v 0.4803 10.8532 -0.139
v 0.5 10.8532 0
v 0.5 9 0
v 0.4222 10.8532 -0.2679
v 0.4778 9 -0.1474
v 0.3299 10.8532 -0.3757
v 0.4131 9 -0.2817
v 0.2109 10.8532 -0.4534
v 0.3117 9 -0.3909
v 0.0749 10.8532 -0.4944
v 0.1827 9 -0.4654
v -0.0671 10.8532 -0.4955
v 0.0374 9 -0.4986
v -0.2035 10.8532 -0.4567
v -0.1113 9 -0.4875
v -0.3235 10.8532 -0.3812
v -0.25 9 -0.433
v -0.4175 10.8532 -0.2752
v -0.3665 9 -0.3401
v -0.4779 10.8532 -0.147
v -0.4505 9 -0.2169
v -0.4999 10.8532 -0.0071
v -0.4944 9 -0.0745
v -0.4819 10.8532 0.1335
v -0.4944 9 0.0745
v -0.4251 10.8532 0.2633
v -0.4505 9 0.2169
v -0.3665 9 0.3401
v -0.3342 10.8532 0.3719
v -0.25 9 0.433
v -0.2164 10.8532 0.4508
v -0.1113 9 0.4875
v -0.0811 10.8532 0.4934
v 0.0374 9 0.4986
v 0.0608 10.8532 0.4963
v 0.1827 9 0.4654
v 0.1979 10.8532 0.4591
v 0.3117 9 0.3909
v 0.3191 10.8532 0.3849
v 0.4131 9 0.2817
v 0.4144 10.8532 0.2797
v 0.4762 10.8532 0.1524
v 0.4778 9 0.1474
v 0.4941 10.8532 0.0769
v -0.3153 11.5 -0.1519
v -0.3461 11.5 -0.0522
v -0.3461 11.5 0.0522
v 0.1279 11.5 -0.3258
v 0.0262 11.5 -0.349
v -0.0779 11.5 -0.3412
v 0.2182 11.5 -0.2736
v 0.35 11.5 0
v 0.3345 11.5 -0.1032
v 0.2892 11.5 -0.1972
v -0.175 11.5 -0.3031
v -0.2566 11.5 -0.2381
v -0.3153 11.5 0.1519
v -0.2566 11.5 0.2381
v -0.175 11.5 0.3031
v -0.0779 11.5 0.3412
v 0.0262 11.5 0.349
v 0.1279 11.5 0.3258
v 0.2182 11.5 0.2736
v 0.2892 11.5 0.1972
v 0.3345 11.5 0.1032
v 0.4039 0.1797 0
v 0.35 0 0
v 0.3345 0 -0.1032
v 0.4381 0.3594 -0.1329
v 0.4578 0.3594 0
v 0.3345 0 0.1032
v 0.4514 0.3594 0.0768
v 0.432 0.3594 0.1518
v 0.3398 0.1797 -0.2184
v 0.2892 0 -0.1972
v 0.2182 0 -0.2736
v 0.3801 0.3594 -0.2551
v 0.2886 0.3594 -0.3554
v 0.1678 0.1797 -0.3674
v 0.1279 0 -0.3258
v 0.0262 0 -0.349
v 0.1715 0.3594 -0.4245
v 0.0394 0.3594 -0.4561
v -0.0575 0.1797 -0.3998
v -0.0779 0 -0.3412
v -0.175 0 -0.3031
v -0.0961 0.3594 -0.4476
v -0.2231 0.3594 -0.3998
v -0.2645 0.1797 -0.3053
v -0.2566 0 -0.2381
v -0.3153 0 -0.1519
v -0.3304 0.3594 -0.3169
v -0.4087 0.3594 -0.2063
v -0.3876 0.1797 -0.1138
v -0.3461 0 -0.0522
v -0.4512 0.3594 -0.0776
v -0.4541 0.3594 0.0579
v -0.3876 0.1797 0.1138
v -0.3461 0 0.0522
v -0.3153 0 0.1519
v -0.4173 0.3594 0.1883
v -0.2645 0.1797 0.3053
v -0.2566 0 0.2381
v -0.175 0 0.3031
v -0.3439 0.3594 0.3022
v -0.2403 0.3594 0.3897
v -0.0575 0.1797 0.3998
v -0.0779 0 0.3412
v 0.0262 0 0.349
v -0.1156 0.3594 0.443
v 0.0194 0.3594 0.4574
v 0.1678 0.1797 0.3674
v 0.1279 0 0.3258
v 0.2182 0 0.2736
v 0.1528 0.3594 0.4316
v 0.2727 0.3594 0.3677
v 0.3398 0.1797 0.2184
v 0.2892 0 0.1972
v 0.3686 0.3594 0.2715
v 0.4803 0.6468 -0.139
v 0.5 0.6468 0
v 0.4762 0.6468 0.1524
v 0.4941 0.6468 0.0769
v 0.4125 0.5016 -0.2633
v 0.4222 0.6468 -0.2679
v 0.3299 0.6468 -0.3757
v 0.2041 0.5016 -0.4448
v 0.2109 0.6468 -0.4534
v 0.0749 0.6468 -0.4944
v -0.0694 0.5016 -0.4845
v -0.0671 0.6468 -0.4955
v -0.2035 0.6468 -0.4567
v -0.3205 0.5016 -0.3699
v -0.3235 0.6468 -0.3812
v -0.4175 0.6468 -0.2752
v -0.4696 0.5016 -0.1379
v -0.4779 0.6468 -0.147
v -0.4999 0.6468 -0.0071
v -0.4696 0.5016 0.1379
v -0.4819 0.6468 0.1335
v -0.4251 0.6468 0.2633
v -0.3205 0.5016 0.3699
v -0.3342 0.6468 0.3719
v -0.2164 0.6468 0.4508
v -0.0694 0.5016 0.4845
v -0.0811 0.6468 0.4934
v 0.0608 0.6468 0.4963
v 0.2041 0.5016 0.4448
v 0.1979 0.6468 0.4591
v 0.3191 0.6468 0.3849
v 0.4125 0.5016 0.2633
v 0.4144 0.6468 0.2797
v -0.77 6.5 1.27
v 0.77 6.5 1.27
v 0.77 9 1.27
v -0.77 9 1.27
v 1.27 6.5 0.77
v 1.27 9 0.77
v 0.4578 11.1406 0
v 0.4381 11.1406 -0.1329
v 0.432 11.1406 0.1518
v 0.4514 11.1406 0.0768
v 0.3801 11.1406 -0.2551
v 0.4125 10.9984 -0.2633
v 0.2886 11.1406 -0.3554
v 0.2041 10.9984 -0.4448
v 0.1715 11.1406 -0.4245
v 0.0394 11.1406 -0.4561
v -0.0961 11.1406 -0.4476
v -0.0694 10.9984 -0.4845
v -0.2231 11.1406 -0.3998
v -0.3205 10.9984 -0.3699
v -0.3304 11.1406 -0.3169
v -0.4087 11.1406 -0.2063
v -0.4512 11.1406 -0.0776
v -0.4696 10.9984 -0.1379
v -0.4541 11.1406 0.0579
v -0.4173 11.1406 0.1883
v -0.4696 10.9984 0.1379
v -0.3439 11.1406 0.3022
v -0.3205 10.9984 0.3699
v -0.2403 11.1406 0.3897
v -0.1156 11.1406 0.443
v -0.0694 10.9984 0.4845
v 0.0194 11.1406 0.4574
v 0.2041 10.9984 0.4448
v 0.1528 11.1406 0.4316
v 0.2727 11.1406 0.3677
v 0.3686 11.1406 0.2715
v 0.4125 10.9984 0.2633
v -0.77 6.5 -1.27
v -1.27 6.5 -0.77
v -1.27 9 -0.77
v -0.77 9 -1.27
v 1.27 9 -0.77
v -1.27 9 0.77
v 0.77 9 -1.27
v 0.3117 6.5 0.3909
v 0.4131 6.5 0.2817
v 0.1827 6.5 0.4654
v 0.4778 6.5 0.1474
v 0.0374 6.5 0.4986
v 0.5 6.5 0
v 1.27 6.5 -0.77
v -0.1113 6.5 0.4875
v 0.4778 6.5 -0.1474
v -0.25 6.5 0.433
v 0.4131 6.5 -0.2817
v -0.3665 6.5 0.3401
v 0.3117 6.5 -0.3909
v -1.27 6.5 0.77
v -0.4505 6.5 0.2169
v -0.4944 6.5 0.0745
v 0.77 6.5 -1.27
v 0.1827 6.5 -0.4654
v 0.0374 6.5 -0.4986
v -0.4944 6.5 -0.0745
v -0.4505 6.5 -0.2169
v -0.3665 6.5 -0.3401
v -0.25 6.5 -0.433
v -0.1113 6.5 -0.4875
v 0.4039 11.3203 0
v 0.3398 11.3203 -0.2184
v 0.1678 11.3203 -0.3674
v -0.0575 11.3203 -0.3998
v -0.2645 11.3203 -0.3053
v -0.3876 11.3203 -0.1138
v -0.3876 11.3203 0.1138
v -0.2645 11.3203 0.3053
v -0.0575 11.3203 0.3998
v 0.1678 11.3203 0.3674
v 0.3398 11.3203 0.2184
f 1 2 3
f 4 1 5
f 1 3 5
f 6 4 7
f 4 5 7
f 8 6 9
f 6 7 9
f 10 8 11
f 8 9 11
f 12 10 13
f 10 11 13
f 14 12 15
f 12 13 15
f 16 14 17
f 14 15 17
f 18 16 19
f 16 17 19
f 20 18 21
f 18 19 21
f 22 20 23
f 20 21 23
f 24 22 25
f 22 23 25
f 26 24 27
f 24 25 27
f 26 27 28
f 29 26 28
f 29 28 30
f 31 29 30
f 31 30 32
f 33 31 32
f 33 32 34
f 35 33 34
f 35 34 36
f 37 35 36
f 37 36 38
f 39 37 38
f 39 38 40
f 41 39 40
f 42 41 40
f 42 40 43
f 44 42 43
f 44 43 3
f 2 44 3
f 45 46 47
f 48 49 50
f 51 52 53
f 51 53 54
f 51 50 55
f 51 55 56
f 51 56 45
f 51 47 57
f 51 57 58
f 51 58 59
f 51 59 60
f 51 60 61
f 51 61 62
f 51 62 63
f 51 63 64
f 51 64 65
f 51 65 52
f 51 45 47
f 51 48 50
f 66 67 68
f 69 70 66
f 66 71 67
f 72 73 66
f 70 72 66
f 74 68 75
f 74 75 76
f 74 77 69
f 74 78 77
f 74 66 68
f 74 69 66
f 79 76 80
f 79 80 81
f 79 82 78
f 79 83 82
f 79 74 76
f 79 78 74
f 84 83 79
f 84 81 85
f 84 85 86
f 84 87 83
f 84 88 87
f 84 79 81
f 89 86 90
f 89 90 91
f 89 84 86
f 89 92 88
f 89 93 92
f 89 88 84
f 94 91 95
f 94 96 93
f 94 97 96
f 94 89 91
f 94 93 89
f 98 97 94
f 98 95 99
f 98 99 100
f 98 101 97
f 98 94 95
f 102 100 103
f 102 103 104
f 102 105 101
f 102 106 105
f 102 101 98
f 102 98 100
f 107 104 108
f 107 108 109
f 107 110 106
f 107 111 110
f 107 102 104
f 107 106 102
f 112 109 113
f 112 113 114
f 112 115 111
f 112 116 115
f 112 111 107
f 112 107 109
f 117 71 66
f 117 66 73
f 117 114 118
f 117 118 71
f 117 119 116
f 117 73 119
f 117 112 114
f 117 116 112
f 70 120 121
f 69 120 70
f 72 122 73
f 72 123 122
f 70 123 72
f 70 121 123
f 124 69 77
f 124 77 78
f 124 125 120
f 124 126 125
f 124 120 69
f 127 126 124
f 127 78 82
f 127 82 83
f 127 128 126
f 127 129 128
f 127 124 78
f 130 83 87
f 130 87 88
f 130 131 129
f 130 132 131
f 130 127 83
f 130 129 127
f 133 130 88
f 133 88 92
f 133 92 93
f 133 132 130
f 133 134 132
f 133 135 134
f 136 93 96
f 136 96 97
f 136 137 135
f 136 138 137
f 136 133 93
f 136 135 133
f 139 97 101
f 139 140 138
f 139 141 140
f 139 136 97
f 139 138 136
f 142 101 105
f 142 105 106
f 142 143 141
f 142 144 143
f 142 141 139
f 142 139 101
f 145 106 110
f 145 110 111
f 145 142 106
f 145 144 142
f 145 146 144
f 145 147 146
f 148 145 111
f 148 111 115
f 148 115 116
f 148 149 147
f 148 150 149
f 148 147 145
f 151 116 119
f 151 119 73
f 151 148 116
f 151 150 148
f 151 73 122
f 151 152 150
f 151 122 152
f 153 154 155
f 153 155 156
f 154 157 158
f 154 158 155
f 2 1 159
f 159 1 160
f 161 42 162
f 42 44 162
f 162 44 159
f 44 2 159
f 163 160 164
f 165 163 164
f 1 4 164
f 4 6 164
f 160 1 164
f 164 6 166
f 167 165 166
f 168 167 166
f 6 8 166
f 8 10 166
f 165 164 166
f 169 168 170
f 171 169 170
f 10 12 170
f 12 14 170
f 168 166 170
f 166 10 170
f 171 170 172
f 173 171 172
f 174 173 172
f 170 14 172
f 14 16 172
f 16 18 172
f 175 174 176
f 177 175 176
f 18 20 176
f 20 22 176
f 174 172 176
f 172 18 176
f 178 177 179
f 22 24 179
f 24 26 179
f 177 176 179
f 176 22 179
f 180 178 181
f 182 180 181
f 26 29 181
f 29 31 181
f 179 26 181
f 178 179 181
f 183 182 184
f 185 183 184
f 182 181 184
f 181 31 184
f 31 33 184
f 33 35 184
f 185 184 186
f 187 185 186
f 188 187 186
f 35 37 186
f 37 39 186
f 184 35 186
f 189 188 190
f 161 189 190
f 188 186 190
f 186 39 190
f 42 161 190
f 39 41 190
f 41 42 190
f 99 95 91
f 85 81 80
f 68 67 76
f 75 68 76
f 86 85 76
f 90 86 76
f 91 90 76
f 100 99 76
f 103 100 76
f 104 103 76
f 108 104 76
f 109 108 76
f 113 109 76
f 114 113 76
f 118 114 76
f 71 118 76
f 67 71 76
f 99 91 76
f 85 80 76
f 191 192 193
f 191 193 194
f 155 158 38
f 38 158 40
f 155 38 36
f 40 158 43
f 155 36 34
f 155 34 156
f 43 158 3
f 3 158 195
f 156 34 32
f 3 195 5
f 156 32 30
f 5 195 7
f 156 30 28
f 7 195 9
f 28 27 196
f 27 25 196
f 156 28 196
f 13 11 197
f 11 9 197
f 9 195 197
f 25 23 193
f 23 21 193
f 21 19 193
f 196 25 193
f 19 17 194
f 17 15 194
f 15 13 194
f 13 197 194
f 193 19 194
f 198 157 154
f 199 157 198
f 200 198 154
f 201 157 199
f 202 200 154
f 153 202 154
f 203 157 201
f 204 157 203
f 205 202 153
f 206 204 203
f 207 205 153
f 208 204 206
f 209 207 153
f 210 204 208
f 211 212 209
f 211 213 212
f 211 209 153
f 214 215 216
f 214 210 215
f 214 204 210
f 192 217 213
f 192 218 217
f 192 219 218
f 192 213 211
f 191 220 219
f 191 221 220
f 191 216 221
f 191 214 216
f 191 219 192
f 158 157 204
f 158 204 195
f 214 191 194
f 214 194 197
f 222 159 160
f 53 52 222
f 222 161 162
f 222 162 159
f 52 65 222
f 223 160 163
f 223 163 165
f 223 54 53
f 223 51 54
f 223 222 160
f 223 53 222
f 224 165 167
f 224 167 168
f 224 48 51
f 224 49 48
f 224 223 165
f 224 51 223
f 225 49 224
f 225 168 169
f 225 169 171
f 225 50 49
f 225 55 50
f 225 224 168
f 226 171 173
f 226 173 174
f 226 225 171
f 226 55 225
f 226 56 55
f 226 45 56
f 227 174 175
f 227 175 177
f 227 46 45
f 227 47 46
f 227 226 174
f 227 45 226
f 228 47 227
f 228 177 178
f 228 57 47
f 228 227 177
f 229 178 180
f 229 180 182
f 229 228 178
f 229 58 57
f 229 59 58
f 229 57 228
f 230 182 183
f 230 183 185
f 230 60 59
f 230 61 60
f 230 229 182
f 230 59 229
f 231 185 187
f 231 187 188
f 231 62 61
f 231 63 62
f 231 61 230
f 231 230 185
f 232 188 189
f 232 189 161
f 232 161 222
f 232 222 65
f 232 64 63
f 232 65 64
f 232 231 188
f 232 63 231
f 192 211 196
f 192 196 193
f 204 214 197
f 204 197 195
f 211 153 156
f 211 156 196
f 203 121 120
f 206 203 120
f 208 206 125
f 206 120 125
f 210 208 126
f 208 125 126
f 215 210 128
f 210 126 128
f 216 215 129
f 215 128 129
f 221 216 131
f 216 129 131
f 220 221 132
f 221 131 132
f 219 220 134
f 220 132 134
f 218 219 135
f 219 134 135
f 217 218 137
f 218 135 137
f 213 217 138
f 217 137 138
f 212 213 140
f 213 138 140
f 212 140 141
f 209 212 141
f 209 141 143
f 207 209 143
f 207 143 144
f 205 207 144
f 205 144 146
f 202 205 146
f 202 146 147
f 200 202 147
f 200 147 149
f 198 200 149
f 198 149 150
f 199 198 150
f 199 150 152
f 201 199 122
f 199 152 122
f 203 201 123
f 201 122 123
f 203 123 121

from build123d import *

# Parameters (mm, degrees)
SKETCH1_R               = 0.5
BOSS_EXTRUDE1_DEPTH     = 11.5
BOSS_EXTRUDE1_2_DEPTH   = 11.5
BOSS_EXTRUDE1_3_DEPTH   = 11.5
BOSS_EXTRUDE1_4_DEPTH   = 11.5
BOSS_EXTRUDE1_5_DEPTH   = 11.5
BOSS_EXTRUDE1_6_DEPTH   = 11.5
BOSS_EXTRUDE1_7_DEPTH   = 11.5
BOSS_EXTRUDE1_8_DEPTH   = 11.5
BOSS_EXTRUDE1_9_DEPTH   = 11.5
BOSS_EXTRUDE1_10_DEPTH  = 11.5
BOSS_EXTRUDE1_11_DEPTH  = 11.5
BOSS_EXTRUDE1_12_DEPTH  = 11.5
BOSS_EXTRUDE1_13_DEPTH  = 11.5
BOSS_EXTRUDE1_14_DEPTH  = 11.5
BOSS_EXTRUDE1_15_DEPTH  = 11.5
BOSS_EXTRUDE1_16_DEPTH  = 11.5
BOSS_EXTRUDE2_DEPTH     = 2.5
CHAMFER1_SIZE           = 0.5
CHAMFER1_SIZE2          = 0.15
CHAMFER1_PART_2_SIZE    = 0.5
CHAMFER1_PART_2_SIZE2   = 0.15
CHAMFER1_PART_3_SIZE    = 0.5
CHAMFER1_PART_3_SIZE2   = 0.15
CHAMFER1_PART_4_SIZE    = 0.5
CHAMFER1_PART_4_SIZE2   = 0.15
CHAMFER1_PART_5_SIZE    = 0.5
CHAMFER1_PART_5_SIZE2   = 0.15
CHAMFER1_PART_6_SIZE    = 0.5
CHAMFER1_PART_6_SIZE2   = 0.15
CHAMFER1_PART_7_SIZE    = 0.5
CHAMFER1_PART_7_SIZE2   = 0.15
CHAMFER1_PART_8_SIZE    = 0.5
CHAMFER1_PART_8_SIZE2   = 0.15
CHAMFER1_PART_9_SIZE    = 0.5
CHAMFER1_PART_9_SIZE2   = 0.15
CHAMFER1_PART_10_SIZE   = 0.5
CHAMFER1_PART_10_SIZE2  = 0.15
CHAMFER1_PART_11_SIZE   = 0.5
CHAMFER1_PART_11_SIZE2  = 0.15
CHAMFER1_PART_12_SIZE   = 0.5
CHAMFER1_PART_12_SIZE2  = 0.15
CHAMFER1_PART_13_SIZE   = 0.5
CHAMFER1_PART_13_SIZE2  = 0.15
CHAMFER1_PART_14_SIZE   = 0.5
CHAMFER1_PART_14_SIZE2  = 0.15
CHAMFER1_PART_15_SIZE   = 0.5
CHAMFER1_PART_15_SIZE2  = 0.15
CHAMFER1_PART_16_SIZE   = 0.5
CHAMFER1_PART_16_SIZE2  = 0.15
FILLET1_R               = 1
CHAMFER2_SIZE           = 0.15
CHAMFER2_SIZE2          = 0.5
CHAMFER2_PART_2_SIZE    = 0.15
CHAMFER2_PART_2_SIZE2   = 0.5
CHAMFER2_PART_3_SIZE    = 0.15
CHAMFER2_PART_3_SIZE2   = 0.5
CHAMFER2_PART_4_SIZE    = 0.15
CHAMFER2_PART_4_SIZE2   = 0.5
CHAMFER2_PART_5_SIZE    = 0.15
CHAMFER2_PART_5_SIZE2   = 0.5
CHAMFER2_PART_6_SIZE    = 0.15
CHAMFER2_PART_6_SIZE2   = 0.5
CHAMFER2_PART_7_SIZE    = 0.15
CHAMFER2_PART_7_SIZE2   = 0.5
CHAMFER2_PART_8_SIZE    = 0.15
CHAMFER2_PART_8_SIZE2   = 0.5
CHAMFER2_PART_9_SIZE    = 0.15
CHAMFER2_PART_9_SIZE2   = 0.5
CHAMFER2_PART_10_SIZE   = 0.15
CHAMFER2_PART_10_SIZE2  = 0.5
CHAMFER2_PART_11_SIZE   = 0.15
CHAMFER2_PART_11_SIZE2  = 0.5
CHAMFER2_PART_12_SIZE   = 0.15
CHAMFER2_PART_12_SIZE2  = 0.5
CHAMFER2_PART_13_SIZE   = 0.15
CHAMFER2_PART_13_SIZE2  = 0.5
CHAMFER2_PART_14_SIZE   = 0.15
CHAMFER2_PART_14_SIZE2  = 0.5
CHAMFER2_PART_15_SIZE   = 0.15
CHAMFER2_PART_15_SIZE2  = 0.5
CHAMFER2_PART_16_SIZE   = 0.15
CHAMFER2_PART_16_SIZE2  = 0.5
FILLET2_R               = 1
SKETCH3_W               = 38.1
SKETCH3_H               = 11.5
CUT_EXTRUDE1_DEPTH      = 1
CUT_EXTRUDE1_DEPTH_BACK = 3.54


with BuildPart() as part:
    # Sketch1 → Boss-Extrude1 (new body)
    with BuildSketch(Plane(origin=(0, 0, 0), x_dir=(1, 0, 0), z_dir=(0, 1, 0))):
        Circle(SKETCH1_R)
    extrude(amount=BOSS_EXTRUDE1_DEPTH)



with BuildPart() as body_2:
    # Sketch1 → Boss-Extrude1 2 (new body)
    with BuildSketch(Plane(origin=(0, 0, 0), x_dir=(1, 0, 0), z_dir=(0, 1, 0))):
        with Locations((2.54, 0)):
            Circle(SKETCH1_R)
    extrude(amount=BOSS_EXTRUDE1_2_DEPTH)


with BuildPart() as body_3:
    # Sketch1 → Boss-Extrude1 3 (new body)
    with BuildSketch(Plane(origin=(0, 0, 0), x_dir=(1, 0, 0), z_dir=(0, 1, 0))):
        with Locations((5.08, 0)):
            Circle(SKETCH1_R)
    extrude(amount=BOSS_EXTRUDE1_3_DEPTH)


with BuildPart() as body_4:
    # Sketch1 → Boss-Extrude1 4 (new body)
    with BuildSketch(Plane(origin=(0, 0, 0), x_dir=(1, 0, 0), z_dir=(0, 1, 0))):
        with Locations((7.62, 0)):
            Circle(SKETCH1_R)
    extrude(amount=BOSS_EXTRUDE1_4_DEPTH)


with BuildPart() as body_5:
    # Sketch1 → Boss-Extrude1 5 (new body)
    with BuildSketch(Plane(origin=(0, 0, 0), x_dir=(1, 0, 0), z_dir=(0, 1, 0))):
        with Locations((10.16, 0)):
            Circle(SKETCH1_R)
    extrude(amount=BOSS_EXTRUDE1_5_DEPTH)


with BuildPart() as body_6:
    # Sketch1 → Boss-Extrude1 6 (new body)
    with BuildSketch(Plane(origin=(0, 0, 0), x_dir=(1, 0, 0), z_dir=(0, 1, 0))):
        with Locations((12.7, 0)):
            Circle(SKETCH1_R)
    extrude(amount=BOSS_EXTRUDE1_6_DEPTH)


with BuildPart() as body_7:
    # Sketch1 → Boss-Extrude1 7 (new body)
    with BuildSketch(Plane(origin=(0, 0, 0), x_dir=(1, 0, 0), z_dir=(0, 1, 0))):
        with Locations((15.24, 0)):
            Circle(SKETCH1_R)
    extrude(amount=BOSS_EXTRUDE1_7_DEPTH)


with BuildPart() as body_8:
    # Sketch1 → Boss-Extrude1 8 (new body)
    with BuildSketch(Plane(origin=(0, 0, 0), x_dir=(1, 0, 0), z_dir=(0, 1, 0))):
        with Locations((17.78, 0)):
            Circle(SKETCH1_R)
    extrude(amount=BOSS_EXTRUDE1_8_DEPTH)


with BuildPart() as body_9:
    # Sketch1 → Boss-Extrude1 9 (new body)
    with BuildSketch(Plane(origin=(0, 0, 0), x_dir=(1, 0, 0), z_dir=(0, 1, 0))):
        with Locations((20.32, 0)):
            Circle(SKETCH1_R)
    extrude(amount=BOSS_EXTRUDE1_9_DEPTH)


with BuildPart() as body_10:
    # Sketch1 → Boss-Extrude1 10 (new body)
    with BuildSketch(Plane(origin=(0, 0, 0), x_dir=(1, 0, 0), z_dir=(0, 1, 0))):
        with Locations((22.86, 0)):
            Circle(SKETCH1_R)
    extrude(amount=BOSS_EXTRUDE1_10_DEPTH)


with BuildPart() as body_11:
    # Sketch1 → Boss-Extrude1 11 (new body)
    with BuildSketch(Plane(origin=(0, 0, 0), x_dir=(1, 0, 0), z_dir=(0, 1, 0))):
        with Locations((25.4, 0)):
            Circle(SKETCH1_R)
    extrude(amount=BOSS_EXTRUDE1_11_DEPTH)


with BuildPart() as body_12:
    # Sketch1 → Boss-Extrude1 12 (new body)
    with BuildSketch(Plane(origin=(0, 0, 0), x_dir=(1, 0, 0), z_dir=(0, 1, 0))):
        with Locations((27.94, 0)):
            Circle(SKETCH1_R)
    extrude(amount=BOSS_EXTRUDE1_12_DEPTH)


with BuildPart() as body_13:
    # Sketch1 → Boss-Extrude1 13 (new body)
    with BuildSketch(Plane(origin=(0, 0, 0), x_dir=(1, 0, 0), z_dir=(0, 1, 0))):
        with Locations((30.48, 0)):
            Circle(SKETCH1_R)
    extrude(amount=BOSS_EXTRUDE1_13_DEPTH)


with BuildPart() as body_14:
    # Sketch1 → Boss-Extrude1 14 (new body)
    with BuildSketch(Plane(origin=(0, 0, 0), x_dir=(1, 0, 0), z_dir=(0, 1, 0))):
        with Locations((33.02, 0)):
            Circle(SKETCH1_R)
    extrude(amount=BOSS_EXTRUDE1_14_DEPTH)


with BuildPart() as body_15:
    # Sketch1 → Boss-Extrude1 15 (new body)
    with BuildSketch(Plane(origin=(0, 0, 0), x_dir=(1, 0, 0), z_dir=(0, 1, 0))):
        with Locations((35.56, 0)):
            Circle(SKETCH1_R)
    extrude(amount=BOSS_EXTRUDE1_15_DEPTH)


with BuildPart() as body_16:
    # Sketch1 → Boss-Extrude1 16 (new body)
    with BuildSketch(Plane(origin=(0, 0, 0), x_dir=(1, 0, 0), z_dir=(0, 1, 0))):
        with Locations((38.1, 0)):
            Circle(SKETCH1_R)
    extrude(amount=BOSS_EXTRUDE1_16_DEPTH)


with BuildPart() as part_1:
    add(part.part)

    add(body_2.part)  # Boss-Extrude2 merges body 2

    add(body_3.part)  # Boss-Extrude2 merges body 3

    add(body_4.part)  # Boss-Extrude2 merges body 4

    add(body_5.part)  # Boss-Extrude2 merges body 5

    add(body_6.part)  # Boss-Extrude2 merges body 6

    add(body_7.part)  # Boss-Extrude2 merges body 7

    add(body_8.part)  # Boss-Extrude2 merges body 8

    add(body_9.part)  # Boss-Extrude2 merges body 9

    add(body_10.part)  # Boss-Extrude2 merges body 10

    add(body_11.part)  # Boss-Extrude2 merges body 11

    add(body_12.part)  # Boss-Extrude2 merges body 12

    add(body_13.part)  # Boss-Extrude2 merges body 13

    add(body_14.part)  # Boss-Extrude2 merges body 14

    add(body_15.part)  # Boss-Extrude2 merges body 15

    add(body_16.part)  # Boss-Extrude2 merges body 16
    # Sketch2 → Boss-Extrude2 (add)
    with BuildSketch(Plane(origin=(0, 6.5, 0), x_dir=(1, 0, 0), z_dir=(0, 1, 0))):
        Polygon((-1.27, 0.77), (-0.77, 1.27), (0.77, 1.27), (1.27, 0.77), (1.77, 1.27), (3.31, 1.27), (3.81, 0.77), (4.31, 1.27), (5.85, 1.27), (6.35, 0.77), (6.85, 1.27), (8.39, 1.27), (8.89, 0.77), (9.39, 1.27), (10.93, 1.27), (11.43, 0.77), (11.93, 1.27), (13.47, 1.27), (13.97, 0.77), (14.47, 1.27), (16.01, 1.27), (16.51, 0.77), (17.01, 1.27), (18.55, 1.27), (19.05, 0.77), (19.55, 1.27), (21.09, 1.27), (21.59, 0.77), (22.09, 1.27), (23.63, 1.27), (24.13, 0.77), (24.63, 1.27), (26.17, 1.27), (26.67, 0.77), (27.17, 1.27), (28.71, 1.27), (29.21, 0.77), (29.71, 1.27), (31.25, 1.27), (31.75, 0.77), (32.25, 1.27), (33.79, 1.27), (34.29, 0.77), (34.79, 1.27), (36.33, 1.27), (36.83, 0.77), (37.33, 1.27), (38.87, 1.27), (39.37, 0.77), (39.37, -0.77), (38.87, -1.27), (37.33, -1.27), (36.83, -0.77), (36.33, -1.27), (34.79, -1.27), (34.29, -0.77), (33.79, -1.27), (32.25, -1.27), (31.75, -0.77), (31.25, -1.27), (29.71, -1.27), (29.21, -0.77), (28.71, -1.27), (27.17, -1.27), (26.67, -0.77), (26.17, -1.27), (24.63, -1.27), (24.13, -0.77), (23.63, -1.27), (22.09, -1.27), (21.59, -0.77), (21.09, -1.27), (19.55, -1.27), (19.05, -0.77), (18.55, -1.27), (17.01, -1.27), (16.51, -0.77), (16.01, -1.27), (14.47, -1.27), (13.97, -0.77), (13.47, -1.27), (11.93, -1.27), (11.43, -0.77), (10.93, -1.27), (9.39, -1.27), (8.89, -0.77), (8.39, -1.27), (6.85, -1.27), (6.35, -0.77), (5.85, -1.27), (4.31, -1.27), (3.81, -0.77), (3.31, -1.27), (1.77, -1.27), (1.27, -0.77), (0.77, -1.27), (-0.77, -1.27), (-1.27, -0.77), align=None)
    extrude(amount=BOSS_EXTRUDE2_DEPTH)

    # Chamfer1
    chamfer1_edges = [part_1.edges().sort_by_distance(p)[0] for p in [
        (2.04, 11.5, 0),
    ]]
    chamfer1_side = [part_1.faces().sort_by_distance(p)[0] for p in [
        (2.04, 10.25, 0),
    ]]
    chamfer(chamfer1_edges, length=CHAMFER1_SIZE, length2=CHAMFER1_SIZE2, reference=chamfer1_side[0])

    # Chamfer1 part 2
    chamfer1_part_2_edges = [part_1.edges().sort_by_distance(p)[0] for p in [
        (4.58, 11.5, 0),
    ]]
    chamfer1_part_2_side = [part_1.faces().sort_by_distance(p)[0] for p in [
        (4.58, 10.25, 0),
    ]]
    chamfer(chamfer1_part_2_edges, length=CHAMFER1_PART_2_SIZE, length2=CHAMFER1_PART_2_SIZE2, reference=chamfer1_part_2_side[0])

    # Chamfer1 part 3
    chamfer1_part_3_edges = [part_1.edges().sort_by_distance(p)[0] for p in [
        (7.12, 11.5, 0),
    ]]
    chamfer1_part_3_side = [part_1.faces().sort_by_distance(p)[0] for p in [
        (7.12, 10.25, 0),
    ]]
    chamfer(chamfer1_part_3_edges, length=CHAMFER1_PART_3_SIZE, length2=CHAMFER1_PART_3_SIZE2, reference=chamfer1_part_3_side[0])

    # Chamfer1 part 4
    chamfer1_part_4_edges = [part_1.edges().sort_by_distance(p)[0] for p in [
        (9.66, 11.5, 0),
    ]]
    chamfer1_part_4_side = [part_1.faces().sort_by_distance(p)[0] for p in [
        (9.66, 10.25, 0),
    ]]
    chamfer(chamfer1_part_4_edges, length=CHAMFER1_PART_4_SIZE, length2=CHAMFER1_PART_4_SIZE2, reference=chamfer1_part_4_side[0])

    # Chamfer1 part 5
    chamfer1_part_5_edges = [part_1.edges().sort_by_distance(p)[0] for p in [
        (12.2, 11.5, 0),
    ]]
    chamfer1_part_5_side = [part_1.faces().sort_by_distance(p)[0] for p in [
        (12.2, 10.25, 0),
    ]]
    chamfer(chamfer1_part_5_edges, length=CHAMFER1_PART_5_SIZE, length2=CHAMFER1_PART_5_SIZE2, reference=chamfer1_part_5_side[0])

    # Chamfer1 part 6
    chamfer1_part_6_edges = [part_1.edges().sort_by_distance(p)[0] for p in [
        (14.74, 11.5, 0),
    ]]
    chamfer1_part_6_side = [part_1.faces().sort_by_distance(p)[0] for p in [
        (14.74, 10.25, 0),
    ]]
    chamfer(chamfer1_part_6_edges, length=CHAMFER1_PART_6_SIZE, length2=CHAMFER1_PART_6_SIZE2, reference=chamfer1_part_6_side[0])

    # Chamfer1 part 7
    chamfer1_part_7_edges = [part_1.edges().sort_by_distance(p)[0] for p in [
        (17.28, 11.5, 0),
    ]]
    chamfer1_part_7_side = [part_1.faces().sort_by_distance(p)[0] for p in [
        (17.28, 10.25, 0),
    ]]
    chamfer(chamfer1_part_7_edges, length=CHAMFER1_PART_7_SIZE, length2=CHAMFER1_PART_7_SIZE2, reference=chamfer1_part_7_side[0])

    # Chamfer1 part 8
    chamfer1_part_8_edges = [part_1.edges().sort_by_distance(p)[0] for p in [
        (19.82, 11.5, 0),
    ]]
    chamfer1_part_8_side = [part_1.faces().sort_by_distance(p)[0] for p in [
        (19.82, 10.25, 0),
    ]]
    chamfer(chamfer1_part_8_edges, length=CHAMFER1_PART_8_SIZE, length2=CHAMFER1_PART_8_SIZE2, reference=chamfer1_part_8_side[0])

    # Chamfer1 part 9
    chamfer1_part_9_edges = [part_1.edges().sort_by_distance(p)[0] for p in [
        (22.36, 11.5, 0),
    ]]
    chamfer1_part_9_side = [part_1.faces().sort_by_distance(p)[0] for p in [
        (22.36, 10.25, 0),
    ]]
    chamfer(chamfer1_part_9_edges, length=CHAMFER1_PART_9_SIZE, length2=CHAMFER1_PART_9_SIZE2, reference=chamfer1_part_9_side[0])

    # Chamfer1 part 10
    chamfer1_part_10_edges = [part_1.edges().sort_by_distance(p)[0] for p in [
        (24.9, 11.5, 0),
    ]]
    chamfer1_part_10_side = [part_1.faces().sort_by_distance(p)[0] for p in [
        (24.9, 10.25, 0),
    ]]
    chamfer(chamfer1_part_10_edges, length=CHAMFER1_PART_10_SIZE, length2=CHAMFER1_PART_10_SIZE2, reference=chamfer1_part_10_side[0])

    # Chamfer1 part 11
    chamfer1_part_11_edges = [part_1.edges().sort_by_distance(p)[0] for p in [
        (27.44, 11.5, 0),
    ]]
    chamfer1_part_11_side = [part_1.faces().sort_by_distance(p)[0] for p in [
        (27.44, 10.25, 0),
    ]]
    chamfer(chamfer1_part_11_edges, length=CHAMFER1_PART_11_SIZE, length2=CHAMFER1_PART_11_SIZE2, reference=chamfer1_part_11_side[0])

    # Chamfer1 part 12
    chamfer1_part_12_edges = [part_1.edges().sort_by_distance(p)[0] for p in [
        (29.98, 11.5, 0),
    ]]
    chamfer1_part_12_side = [part_1.faces().sort_by_distance(p)[0] for p in [
        (29.98, 10.25, 0),
    ]]
    chamfer(chamfer1_part_12_edges, length=CHAMFER1_PART_12_SIZE, length2=CHAMFER1_PART_12_SIZE2, reference=chamfer1_part_12_side[0])

    # Chamfer1 part 13
    chamfer1_part_13_edges = [part_1.edges().sort_by_distance(p)[0] for p in [
        (32.52, 11.5, 0),
    ]]
    chamfer1_part_13_side = [part_1.faces().sort_by_distance(p)[0] for p in [
        (32.52, 10.25, 0),
    ]]
    chamfer(chamfer1_part_13_edges, length=CHAMFER1_PART_13_SIZE, length2=CHAMFER1_PART_13_SIZE2, reference=chamfer1_part_13_side[0])

    # Chamfer1 part 14
    chamfer1_part_14_edges = [part_1.edges().sort_by_distance(p)[0] for p in [
        (35.06, 11.5, 0),
    ]]
    chamfer1_part_14_side = [part_1.faces().sort_by_distance(p)[0] for p in [
        (35.06, 10.25, 0),
    ]]
    chamfer(chamfer1_part_14_edges, length=CHAMFER1_PART_14_SIZE, length2=CHAMFER1_PART_14_SIZE2, reference=chamfer1_part_14_side[0])

    # Chamfer1 part 15
    chamfer1_part_15_edges = [part_1.edges().sort_by_distance(p)[0] for p in [
        (37.6, 11.5, 0),
    ]]
    chamfer1_part_15_side = [part_1.faces().sort_by_distance(p)[0] for p in [
        (37.6, 10.25, 0),
    ]]
    chamfer(chamfer1_part_15_edges, length=CHAMFER1_PART_15_SIZE, length2=CHAMFER1_PART_15_SIZE2, reference=chamfer1_part_15_side[0])

    # Chamfer1 part 16
    chamfer1_part_16_edges = [part_1.edges().sort_by_distance(p)[0] for p in [
        (-0.5, 11.5, 0),
    ]]
    chamfer1_part_16_side = [part_1.faces().sort_by_distance(p)[0] for p in [
        (-0.5, 10.25, 0),
    ]]
    chamfer(chamfer1_part_16_edges, length=CHAMFER1_PART_16_SIZE, length2=CHAMFER1_PART_16_SIZE2, reference=chamfer1_part_16_side[0])

    # Fillet1
    fillet1_edges = [part_1.edges().sort_by_distance(p)[0] for p in [
        (37.6, 11, 0),
        (35.06, 11, 0),
        (32.52, 11, 0),
        (29.98, 11, 0),
        (27.44, 11, 0),
        (24.9, 11, 0),
        (22.36, 11, 0),
        (19.82, 11, 0),
        (17.28, 11, 0),
        (14.74, 11, 0),
        (12.2, 11, 0),
        (9.66, 11, 0),
        (7.12, 11, 0),
        (4.58, 11, 0),
        (2.04, 11, 0),
        (-0.5, 11, 0),
    ]]
    fillet(fillet1_edges, radius=FILLET1_R)

    # Chamfer2
    chamfer2_edges = [part_1.edges().sort_by_distance(p)[0] for p in [
        (-0.5, 0, 0),
    ]]
    chamfer2_side = [part_1.faces().sort_by_distance(p)[0] for p in [
        (0, 0, 0),
    ]]
    chamfer(chamfer2_edges, length=CHAMFER2_SIZE, length2=CHAMFER2_SIZE2, reference=chamfer2_side[0])

    # Chamfer2 part 2
    chamfer2_part_2_edges = [part_1.edges().sort_by_distance(p)[0] for p in [
        (2.04, 0, 0),
    ]]
    chamfer2_part_2_side = [part_1.faces().sort_by_distance(p)[0] for p in [
        (2.54, 0, 0),
    ]]
    chamfer(chamfer2_part_2_edges, length=CHAMFER2_PART_2_SIZE, length2=CHAMFER2_PART_2_SIZE2, reference=chamfer2_part_2_side[0])

    # Chamfer2 part 3
    chamfer2_part_3_edges = [part_1.edges().sort_by_distance(p)[0] for p in [
        (4.58, 0, 0),
    ]]
    chamfer2_part_3_side = [part_1.faces().sort_by_distance(p)[0] for p in [
        (5.08, 0, 0),
    ]]
    chamfer(chamfer2_part_3_edges, length=CHAMFER2_PART_3_SIZE, length2=CHAMFER2_PART_3_SIZE2, reference=chamfer2_part_3_side[0])

    # Chamfer2 part 4
    chamfer2_part_4_edges = [part_1.edges().sort_by_distance(p)[0] for p in [
        (7.12, 0, 0),
    ]]
    chamfer2_part_4_side = [part_1.faces().sort_by_distance(p)[0] for p in [
        (7.62, 0, 0),
    ]]
    chamfer(chamfer2_part_4_edges, length=CHAMFER2_PART_4_SIZE, length2=CHAMFER2_PART_4_SIZE2, reference=chamfer2_part_4_side[0])

    # Chamfer2 part 5
    chamfer2_part_5_edges = [part_1.edges().sort_by_distance(p)[0] for p in [
        (9.66, 0, 0),
    ]]
    chamfer2_part_5_side = [part_1.faces().sort_by_distance(p)[0] for p in [
        (10.16, 0, 0),
    ]]
    chamfer(chamfer2_part_5_edges, length=CHAMFER2_PART_5_SIZE, length2=CHAMFER2_PART_5_SIZE2, reference=chamfer2_part_5_side[0])

    # Chamfer2 part 6
    chamfer2_part_6_edges = [part_1.edges().sort_by_distance(p)[0] for p in [
        (12.2, 0, 0),
    ]]
    chamfer2_part_6_side = [part_1.faces().sort_by_distance(p)[0] for p in [
        (12.7, 0, 0),
    ]]
    chamfer(chamfer2_part_6_edges, length=CHAMFER2_PART_6_SIZE, length2=CHAMFER2_PART_6_SIZE2, reference=chamfer2_part_6_side[0])

    # Chamfer2 part 7
    chamfer2_part_7_edges = [part_1.edges().sort_by_distance(p)[0] for p in [
        (14.74, 0, 0),
    ]]
    chamfer2_part_7_side = [part_1.faces().sort_by_distance(p)[0] for p in [
        (15.24, 0, 0),
    ]]
    chamfer(chamfer2_part_7_edges, length=CHAMFER2_PART_7_SIZE, length2=CHAMFER2_PART_7_SIZE2, reference=chamfer2_part_7_side[0])

    # Chamfer2 part 8
    chamfer2_part_8_edges = [part_1.edges().sort_by_distance(p)[0] for p in [
        (17.28, 0, 0),
    ]]
    chamfer2_part_8_side = [part_1.faces().sort_by_distance(p)[0] for p in [
        (17.78, 0, 0),
    ]]
    chamfer(chamfer2_part_8_edges, length=CHAMFER2_PART_8_SIZE, length2=CHAMFER2_PART_8_SIZE2, reference=chamfer2_part_8_side[0])

    # Chamfer2 part 9
    chamfer2_part_9_edges = [part_1.edges().sort_by_distance(p)[0] for p in [
        (19.82, 0, 0),
    ]]
    chamfer2_part_9_side = [part_1.faces().sort_by_distance(p)[0] for p in [
        (20.32, 0, 0),
    ]]
    chamfer(chamfer2_part_9_edges, length=CHAMFER2_PART_9_SIZE, length2=CHAMFER2_PART_9_SIZE2, reference=chamfer2_part_9_side[0])

    # Chamfer2 part 10
    chamfer2_part_10_edges = [part_1.edges().sort_by_distance(p)[0] for p in [
        (22.36, 0, 0),
    ]]
    chamfer2_part_10_side = [part_1.faces().sort_by_distance(p)[0] for p in [
        (22.86, 0, 0),
    ]]
    chamfer(chamfer2_part_10_edges, length=CHAMFER2_PART_10_SIZE, length2=CHAMFER2_PART_10_SIZE2, reference=chamfer2_part_10_side[0])

    # Chamfer2 part 11
    chamfer2_part_11_edges = [part_1.edges().sort_by_distance(p)[0] for p in [
        (24.9, 0, 0),
    ]]
    chamfer2_part_11_side = [part_1.faces().sort_by_distance(p)[0] for p in [
        (25.4, 0, 0),
    ]]
    chamfer(chamfer2_part_11_edges, length=CHAMFER2_PART_11_SIZE, length2=CHAMFER2_PART_11_SIZE2, reference=chamfer2_part_11_side[0])

    # Chamfer2 part 12
    chamfer2_part_12_edges = [part_1.edges().sort_by_distance(p)[0] for p in [
        (27.44, 0, 0),
    ]]
    chamfer2_part_12_side = [part_1.faces().sort_by_distance(p)[0] for p in [
        (27.94, 0, 0),
    ]]
    chamfer(chamfer2_part_12_edges, length=CHAMFER2_PART_12_SIZE, length2=CHAMFER2_PART_12_SIZE2, reference=chamfer2_part_12_side[0])

    # Chamfer2 part 13
    chamfer2_part_13_edges = [part_1.edges().sort_by_distance(p)[0] for p in [
        (29.98, 0, 0),
    ]]
    chamfer2_part_13_side = [part_1.faces().sort_by_distance(p)[0] for p in [
        (30.48, 0, 0),
    ]]
    chamfer(chamfer2_part_13_edges, length=CHAMFER2_PART_13_SIZE, length2=CHAMFER2_PART_13_SIZE2, reference=chamfer2_part_13_side[0])

    # Chamfer2 part 14
    chamfer2_part_14_edges = [part_1.edges().sort_by_distance(p)[0] for p in [
        (32.52, 0, 0),
    ]]
    chamfer2_part_14_side = [part_1.faces().sort_by_distance(p)[0] for p in [
        (33.02, 0, 0),
    ]]
    chamfer(chamfer2_part_14_edges, length=CHAMFER2_PART_14_SIZE, length2=CHAMFER2_PART_14_SIZE2, reference=chamfer2_part_14_side[0])

    # Chamfer2 part 15
    chamfer2_part_15_edges = [part_1.edges().sort_by_distance(p)[0] for p in [
        (35.06, 0, 0),
    ]]
    chamfer2_part_15_side = [part_1.faces().sort_by_distance(p)[0] for p in [
        (35.56, 0, 0),
    ]]
    chamfer(chamfer2_part_15_edges, length=CHAMFER2_PART_15_SIZE, length2=CHAMFER2_PART_15_SIZE2, reference=chamfer2_part_15_side[0])

    # Chamfer2 part 16
    chamfer2_part_16_edges = [part_1.edges().sort_by_distance(p)[0] for p in [
        (37.6, 0, 0),
    ]]
    chamfer2_part_16_side = [part_1.faces().sort_by_distance(p)[0] for p in [
        (38.1, 0, 0),
    ]]
    chamfer(chamfer2_part_16_edges, length=CHAMFER2_PART_16_SIZE, length2=CHAMFER2_PART_16_SIZE2, reference=chamfer2_part_16_side[0])

    # Fillet2
    fillet2_edges = [part_1.edges().sort_by_distance(p)[0] for p in [
        (9.66, 0.5, 0),
        (17.28, 0.5, 0),
        (22.36, 0.5, 0),
        (27.44, 0.5, 0),
        (29.98, 0.5, 0),
        (-0.5, 0.5, 0),
        (2.04, 0.5, 0),
        (4.58, 0.5, 0),
        (7.12, 0.5, 0),
        (12.2, 0.5, 0),
        (14.74, 0.5, 0),
        (19.82, 0.5, 0),
        (24.9, 0.5, 0),
        (32.52, 0.5, 0),
        (35.06, 0.5, 0),
        (37.6, 0.5, 0),
    ]]
    fillet(fillet2_edges, radius=FILLET2_R)

    # Sketch3 → Cut-Extrude1 (cut, two sides)
    with BuildSketch(Plane.XY.offset(1.27)) as cut_extrude1_sk:
        with Locations((20.32, 5.75)):
            Rectangle(SKETCH3_W, SKETCH3_H)
    extrude(amount=CUT_EXTRUDE1_DEPTH, mode=Mode.SUBTRACT)
    extrude(cut_extrude1_sk.sketch, amount=-CUT_EXTRUDE1_DEPTH_BACK, mode=Mode.SUBTRACT)


solid = part_1.part
